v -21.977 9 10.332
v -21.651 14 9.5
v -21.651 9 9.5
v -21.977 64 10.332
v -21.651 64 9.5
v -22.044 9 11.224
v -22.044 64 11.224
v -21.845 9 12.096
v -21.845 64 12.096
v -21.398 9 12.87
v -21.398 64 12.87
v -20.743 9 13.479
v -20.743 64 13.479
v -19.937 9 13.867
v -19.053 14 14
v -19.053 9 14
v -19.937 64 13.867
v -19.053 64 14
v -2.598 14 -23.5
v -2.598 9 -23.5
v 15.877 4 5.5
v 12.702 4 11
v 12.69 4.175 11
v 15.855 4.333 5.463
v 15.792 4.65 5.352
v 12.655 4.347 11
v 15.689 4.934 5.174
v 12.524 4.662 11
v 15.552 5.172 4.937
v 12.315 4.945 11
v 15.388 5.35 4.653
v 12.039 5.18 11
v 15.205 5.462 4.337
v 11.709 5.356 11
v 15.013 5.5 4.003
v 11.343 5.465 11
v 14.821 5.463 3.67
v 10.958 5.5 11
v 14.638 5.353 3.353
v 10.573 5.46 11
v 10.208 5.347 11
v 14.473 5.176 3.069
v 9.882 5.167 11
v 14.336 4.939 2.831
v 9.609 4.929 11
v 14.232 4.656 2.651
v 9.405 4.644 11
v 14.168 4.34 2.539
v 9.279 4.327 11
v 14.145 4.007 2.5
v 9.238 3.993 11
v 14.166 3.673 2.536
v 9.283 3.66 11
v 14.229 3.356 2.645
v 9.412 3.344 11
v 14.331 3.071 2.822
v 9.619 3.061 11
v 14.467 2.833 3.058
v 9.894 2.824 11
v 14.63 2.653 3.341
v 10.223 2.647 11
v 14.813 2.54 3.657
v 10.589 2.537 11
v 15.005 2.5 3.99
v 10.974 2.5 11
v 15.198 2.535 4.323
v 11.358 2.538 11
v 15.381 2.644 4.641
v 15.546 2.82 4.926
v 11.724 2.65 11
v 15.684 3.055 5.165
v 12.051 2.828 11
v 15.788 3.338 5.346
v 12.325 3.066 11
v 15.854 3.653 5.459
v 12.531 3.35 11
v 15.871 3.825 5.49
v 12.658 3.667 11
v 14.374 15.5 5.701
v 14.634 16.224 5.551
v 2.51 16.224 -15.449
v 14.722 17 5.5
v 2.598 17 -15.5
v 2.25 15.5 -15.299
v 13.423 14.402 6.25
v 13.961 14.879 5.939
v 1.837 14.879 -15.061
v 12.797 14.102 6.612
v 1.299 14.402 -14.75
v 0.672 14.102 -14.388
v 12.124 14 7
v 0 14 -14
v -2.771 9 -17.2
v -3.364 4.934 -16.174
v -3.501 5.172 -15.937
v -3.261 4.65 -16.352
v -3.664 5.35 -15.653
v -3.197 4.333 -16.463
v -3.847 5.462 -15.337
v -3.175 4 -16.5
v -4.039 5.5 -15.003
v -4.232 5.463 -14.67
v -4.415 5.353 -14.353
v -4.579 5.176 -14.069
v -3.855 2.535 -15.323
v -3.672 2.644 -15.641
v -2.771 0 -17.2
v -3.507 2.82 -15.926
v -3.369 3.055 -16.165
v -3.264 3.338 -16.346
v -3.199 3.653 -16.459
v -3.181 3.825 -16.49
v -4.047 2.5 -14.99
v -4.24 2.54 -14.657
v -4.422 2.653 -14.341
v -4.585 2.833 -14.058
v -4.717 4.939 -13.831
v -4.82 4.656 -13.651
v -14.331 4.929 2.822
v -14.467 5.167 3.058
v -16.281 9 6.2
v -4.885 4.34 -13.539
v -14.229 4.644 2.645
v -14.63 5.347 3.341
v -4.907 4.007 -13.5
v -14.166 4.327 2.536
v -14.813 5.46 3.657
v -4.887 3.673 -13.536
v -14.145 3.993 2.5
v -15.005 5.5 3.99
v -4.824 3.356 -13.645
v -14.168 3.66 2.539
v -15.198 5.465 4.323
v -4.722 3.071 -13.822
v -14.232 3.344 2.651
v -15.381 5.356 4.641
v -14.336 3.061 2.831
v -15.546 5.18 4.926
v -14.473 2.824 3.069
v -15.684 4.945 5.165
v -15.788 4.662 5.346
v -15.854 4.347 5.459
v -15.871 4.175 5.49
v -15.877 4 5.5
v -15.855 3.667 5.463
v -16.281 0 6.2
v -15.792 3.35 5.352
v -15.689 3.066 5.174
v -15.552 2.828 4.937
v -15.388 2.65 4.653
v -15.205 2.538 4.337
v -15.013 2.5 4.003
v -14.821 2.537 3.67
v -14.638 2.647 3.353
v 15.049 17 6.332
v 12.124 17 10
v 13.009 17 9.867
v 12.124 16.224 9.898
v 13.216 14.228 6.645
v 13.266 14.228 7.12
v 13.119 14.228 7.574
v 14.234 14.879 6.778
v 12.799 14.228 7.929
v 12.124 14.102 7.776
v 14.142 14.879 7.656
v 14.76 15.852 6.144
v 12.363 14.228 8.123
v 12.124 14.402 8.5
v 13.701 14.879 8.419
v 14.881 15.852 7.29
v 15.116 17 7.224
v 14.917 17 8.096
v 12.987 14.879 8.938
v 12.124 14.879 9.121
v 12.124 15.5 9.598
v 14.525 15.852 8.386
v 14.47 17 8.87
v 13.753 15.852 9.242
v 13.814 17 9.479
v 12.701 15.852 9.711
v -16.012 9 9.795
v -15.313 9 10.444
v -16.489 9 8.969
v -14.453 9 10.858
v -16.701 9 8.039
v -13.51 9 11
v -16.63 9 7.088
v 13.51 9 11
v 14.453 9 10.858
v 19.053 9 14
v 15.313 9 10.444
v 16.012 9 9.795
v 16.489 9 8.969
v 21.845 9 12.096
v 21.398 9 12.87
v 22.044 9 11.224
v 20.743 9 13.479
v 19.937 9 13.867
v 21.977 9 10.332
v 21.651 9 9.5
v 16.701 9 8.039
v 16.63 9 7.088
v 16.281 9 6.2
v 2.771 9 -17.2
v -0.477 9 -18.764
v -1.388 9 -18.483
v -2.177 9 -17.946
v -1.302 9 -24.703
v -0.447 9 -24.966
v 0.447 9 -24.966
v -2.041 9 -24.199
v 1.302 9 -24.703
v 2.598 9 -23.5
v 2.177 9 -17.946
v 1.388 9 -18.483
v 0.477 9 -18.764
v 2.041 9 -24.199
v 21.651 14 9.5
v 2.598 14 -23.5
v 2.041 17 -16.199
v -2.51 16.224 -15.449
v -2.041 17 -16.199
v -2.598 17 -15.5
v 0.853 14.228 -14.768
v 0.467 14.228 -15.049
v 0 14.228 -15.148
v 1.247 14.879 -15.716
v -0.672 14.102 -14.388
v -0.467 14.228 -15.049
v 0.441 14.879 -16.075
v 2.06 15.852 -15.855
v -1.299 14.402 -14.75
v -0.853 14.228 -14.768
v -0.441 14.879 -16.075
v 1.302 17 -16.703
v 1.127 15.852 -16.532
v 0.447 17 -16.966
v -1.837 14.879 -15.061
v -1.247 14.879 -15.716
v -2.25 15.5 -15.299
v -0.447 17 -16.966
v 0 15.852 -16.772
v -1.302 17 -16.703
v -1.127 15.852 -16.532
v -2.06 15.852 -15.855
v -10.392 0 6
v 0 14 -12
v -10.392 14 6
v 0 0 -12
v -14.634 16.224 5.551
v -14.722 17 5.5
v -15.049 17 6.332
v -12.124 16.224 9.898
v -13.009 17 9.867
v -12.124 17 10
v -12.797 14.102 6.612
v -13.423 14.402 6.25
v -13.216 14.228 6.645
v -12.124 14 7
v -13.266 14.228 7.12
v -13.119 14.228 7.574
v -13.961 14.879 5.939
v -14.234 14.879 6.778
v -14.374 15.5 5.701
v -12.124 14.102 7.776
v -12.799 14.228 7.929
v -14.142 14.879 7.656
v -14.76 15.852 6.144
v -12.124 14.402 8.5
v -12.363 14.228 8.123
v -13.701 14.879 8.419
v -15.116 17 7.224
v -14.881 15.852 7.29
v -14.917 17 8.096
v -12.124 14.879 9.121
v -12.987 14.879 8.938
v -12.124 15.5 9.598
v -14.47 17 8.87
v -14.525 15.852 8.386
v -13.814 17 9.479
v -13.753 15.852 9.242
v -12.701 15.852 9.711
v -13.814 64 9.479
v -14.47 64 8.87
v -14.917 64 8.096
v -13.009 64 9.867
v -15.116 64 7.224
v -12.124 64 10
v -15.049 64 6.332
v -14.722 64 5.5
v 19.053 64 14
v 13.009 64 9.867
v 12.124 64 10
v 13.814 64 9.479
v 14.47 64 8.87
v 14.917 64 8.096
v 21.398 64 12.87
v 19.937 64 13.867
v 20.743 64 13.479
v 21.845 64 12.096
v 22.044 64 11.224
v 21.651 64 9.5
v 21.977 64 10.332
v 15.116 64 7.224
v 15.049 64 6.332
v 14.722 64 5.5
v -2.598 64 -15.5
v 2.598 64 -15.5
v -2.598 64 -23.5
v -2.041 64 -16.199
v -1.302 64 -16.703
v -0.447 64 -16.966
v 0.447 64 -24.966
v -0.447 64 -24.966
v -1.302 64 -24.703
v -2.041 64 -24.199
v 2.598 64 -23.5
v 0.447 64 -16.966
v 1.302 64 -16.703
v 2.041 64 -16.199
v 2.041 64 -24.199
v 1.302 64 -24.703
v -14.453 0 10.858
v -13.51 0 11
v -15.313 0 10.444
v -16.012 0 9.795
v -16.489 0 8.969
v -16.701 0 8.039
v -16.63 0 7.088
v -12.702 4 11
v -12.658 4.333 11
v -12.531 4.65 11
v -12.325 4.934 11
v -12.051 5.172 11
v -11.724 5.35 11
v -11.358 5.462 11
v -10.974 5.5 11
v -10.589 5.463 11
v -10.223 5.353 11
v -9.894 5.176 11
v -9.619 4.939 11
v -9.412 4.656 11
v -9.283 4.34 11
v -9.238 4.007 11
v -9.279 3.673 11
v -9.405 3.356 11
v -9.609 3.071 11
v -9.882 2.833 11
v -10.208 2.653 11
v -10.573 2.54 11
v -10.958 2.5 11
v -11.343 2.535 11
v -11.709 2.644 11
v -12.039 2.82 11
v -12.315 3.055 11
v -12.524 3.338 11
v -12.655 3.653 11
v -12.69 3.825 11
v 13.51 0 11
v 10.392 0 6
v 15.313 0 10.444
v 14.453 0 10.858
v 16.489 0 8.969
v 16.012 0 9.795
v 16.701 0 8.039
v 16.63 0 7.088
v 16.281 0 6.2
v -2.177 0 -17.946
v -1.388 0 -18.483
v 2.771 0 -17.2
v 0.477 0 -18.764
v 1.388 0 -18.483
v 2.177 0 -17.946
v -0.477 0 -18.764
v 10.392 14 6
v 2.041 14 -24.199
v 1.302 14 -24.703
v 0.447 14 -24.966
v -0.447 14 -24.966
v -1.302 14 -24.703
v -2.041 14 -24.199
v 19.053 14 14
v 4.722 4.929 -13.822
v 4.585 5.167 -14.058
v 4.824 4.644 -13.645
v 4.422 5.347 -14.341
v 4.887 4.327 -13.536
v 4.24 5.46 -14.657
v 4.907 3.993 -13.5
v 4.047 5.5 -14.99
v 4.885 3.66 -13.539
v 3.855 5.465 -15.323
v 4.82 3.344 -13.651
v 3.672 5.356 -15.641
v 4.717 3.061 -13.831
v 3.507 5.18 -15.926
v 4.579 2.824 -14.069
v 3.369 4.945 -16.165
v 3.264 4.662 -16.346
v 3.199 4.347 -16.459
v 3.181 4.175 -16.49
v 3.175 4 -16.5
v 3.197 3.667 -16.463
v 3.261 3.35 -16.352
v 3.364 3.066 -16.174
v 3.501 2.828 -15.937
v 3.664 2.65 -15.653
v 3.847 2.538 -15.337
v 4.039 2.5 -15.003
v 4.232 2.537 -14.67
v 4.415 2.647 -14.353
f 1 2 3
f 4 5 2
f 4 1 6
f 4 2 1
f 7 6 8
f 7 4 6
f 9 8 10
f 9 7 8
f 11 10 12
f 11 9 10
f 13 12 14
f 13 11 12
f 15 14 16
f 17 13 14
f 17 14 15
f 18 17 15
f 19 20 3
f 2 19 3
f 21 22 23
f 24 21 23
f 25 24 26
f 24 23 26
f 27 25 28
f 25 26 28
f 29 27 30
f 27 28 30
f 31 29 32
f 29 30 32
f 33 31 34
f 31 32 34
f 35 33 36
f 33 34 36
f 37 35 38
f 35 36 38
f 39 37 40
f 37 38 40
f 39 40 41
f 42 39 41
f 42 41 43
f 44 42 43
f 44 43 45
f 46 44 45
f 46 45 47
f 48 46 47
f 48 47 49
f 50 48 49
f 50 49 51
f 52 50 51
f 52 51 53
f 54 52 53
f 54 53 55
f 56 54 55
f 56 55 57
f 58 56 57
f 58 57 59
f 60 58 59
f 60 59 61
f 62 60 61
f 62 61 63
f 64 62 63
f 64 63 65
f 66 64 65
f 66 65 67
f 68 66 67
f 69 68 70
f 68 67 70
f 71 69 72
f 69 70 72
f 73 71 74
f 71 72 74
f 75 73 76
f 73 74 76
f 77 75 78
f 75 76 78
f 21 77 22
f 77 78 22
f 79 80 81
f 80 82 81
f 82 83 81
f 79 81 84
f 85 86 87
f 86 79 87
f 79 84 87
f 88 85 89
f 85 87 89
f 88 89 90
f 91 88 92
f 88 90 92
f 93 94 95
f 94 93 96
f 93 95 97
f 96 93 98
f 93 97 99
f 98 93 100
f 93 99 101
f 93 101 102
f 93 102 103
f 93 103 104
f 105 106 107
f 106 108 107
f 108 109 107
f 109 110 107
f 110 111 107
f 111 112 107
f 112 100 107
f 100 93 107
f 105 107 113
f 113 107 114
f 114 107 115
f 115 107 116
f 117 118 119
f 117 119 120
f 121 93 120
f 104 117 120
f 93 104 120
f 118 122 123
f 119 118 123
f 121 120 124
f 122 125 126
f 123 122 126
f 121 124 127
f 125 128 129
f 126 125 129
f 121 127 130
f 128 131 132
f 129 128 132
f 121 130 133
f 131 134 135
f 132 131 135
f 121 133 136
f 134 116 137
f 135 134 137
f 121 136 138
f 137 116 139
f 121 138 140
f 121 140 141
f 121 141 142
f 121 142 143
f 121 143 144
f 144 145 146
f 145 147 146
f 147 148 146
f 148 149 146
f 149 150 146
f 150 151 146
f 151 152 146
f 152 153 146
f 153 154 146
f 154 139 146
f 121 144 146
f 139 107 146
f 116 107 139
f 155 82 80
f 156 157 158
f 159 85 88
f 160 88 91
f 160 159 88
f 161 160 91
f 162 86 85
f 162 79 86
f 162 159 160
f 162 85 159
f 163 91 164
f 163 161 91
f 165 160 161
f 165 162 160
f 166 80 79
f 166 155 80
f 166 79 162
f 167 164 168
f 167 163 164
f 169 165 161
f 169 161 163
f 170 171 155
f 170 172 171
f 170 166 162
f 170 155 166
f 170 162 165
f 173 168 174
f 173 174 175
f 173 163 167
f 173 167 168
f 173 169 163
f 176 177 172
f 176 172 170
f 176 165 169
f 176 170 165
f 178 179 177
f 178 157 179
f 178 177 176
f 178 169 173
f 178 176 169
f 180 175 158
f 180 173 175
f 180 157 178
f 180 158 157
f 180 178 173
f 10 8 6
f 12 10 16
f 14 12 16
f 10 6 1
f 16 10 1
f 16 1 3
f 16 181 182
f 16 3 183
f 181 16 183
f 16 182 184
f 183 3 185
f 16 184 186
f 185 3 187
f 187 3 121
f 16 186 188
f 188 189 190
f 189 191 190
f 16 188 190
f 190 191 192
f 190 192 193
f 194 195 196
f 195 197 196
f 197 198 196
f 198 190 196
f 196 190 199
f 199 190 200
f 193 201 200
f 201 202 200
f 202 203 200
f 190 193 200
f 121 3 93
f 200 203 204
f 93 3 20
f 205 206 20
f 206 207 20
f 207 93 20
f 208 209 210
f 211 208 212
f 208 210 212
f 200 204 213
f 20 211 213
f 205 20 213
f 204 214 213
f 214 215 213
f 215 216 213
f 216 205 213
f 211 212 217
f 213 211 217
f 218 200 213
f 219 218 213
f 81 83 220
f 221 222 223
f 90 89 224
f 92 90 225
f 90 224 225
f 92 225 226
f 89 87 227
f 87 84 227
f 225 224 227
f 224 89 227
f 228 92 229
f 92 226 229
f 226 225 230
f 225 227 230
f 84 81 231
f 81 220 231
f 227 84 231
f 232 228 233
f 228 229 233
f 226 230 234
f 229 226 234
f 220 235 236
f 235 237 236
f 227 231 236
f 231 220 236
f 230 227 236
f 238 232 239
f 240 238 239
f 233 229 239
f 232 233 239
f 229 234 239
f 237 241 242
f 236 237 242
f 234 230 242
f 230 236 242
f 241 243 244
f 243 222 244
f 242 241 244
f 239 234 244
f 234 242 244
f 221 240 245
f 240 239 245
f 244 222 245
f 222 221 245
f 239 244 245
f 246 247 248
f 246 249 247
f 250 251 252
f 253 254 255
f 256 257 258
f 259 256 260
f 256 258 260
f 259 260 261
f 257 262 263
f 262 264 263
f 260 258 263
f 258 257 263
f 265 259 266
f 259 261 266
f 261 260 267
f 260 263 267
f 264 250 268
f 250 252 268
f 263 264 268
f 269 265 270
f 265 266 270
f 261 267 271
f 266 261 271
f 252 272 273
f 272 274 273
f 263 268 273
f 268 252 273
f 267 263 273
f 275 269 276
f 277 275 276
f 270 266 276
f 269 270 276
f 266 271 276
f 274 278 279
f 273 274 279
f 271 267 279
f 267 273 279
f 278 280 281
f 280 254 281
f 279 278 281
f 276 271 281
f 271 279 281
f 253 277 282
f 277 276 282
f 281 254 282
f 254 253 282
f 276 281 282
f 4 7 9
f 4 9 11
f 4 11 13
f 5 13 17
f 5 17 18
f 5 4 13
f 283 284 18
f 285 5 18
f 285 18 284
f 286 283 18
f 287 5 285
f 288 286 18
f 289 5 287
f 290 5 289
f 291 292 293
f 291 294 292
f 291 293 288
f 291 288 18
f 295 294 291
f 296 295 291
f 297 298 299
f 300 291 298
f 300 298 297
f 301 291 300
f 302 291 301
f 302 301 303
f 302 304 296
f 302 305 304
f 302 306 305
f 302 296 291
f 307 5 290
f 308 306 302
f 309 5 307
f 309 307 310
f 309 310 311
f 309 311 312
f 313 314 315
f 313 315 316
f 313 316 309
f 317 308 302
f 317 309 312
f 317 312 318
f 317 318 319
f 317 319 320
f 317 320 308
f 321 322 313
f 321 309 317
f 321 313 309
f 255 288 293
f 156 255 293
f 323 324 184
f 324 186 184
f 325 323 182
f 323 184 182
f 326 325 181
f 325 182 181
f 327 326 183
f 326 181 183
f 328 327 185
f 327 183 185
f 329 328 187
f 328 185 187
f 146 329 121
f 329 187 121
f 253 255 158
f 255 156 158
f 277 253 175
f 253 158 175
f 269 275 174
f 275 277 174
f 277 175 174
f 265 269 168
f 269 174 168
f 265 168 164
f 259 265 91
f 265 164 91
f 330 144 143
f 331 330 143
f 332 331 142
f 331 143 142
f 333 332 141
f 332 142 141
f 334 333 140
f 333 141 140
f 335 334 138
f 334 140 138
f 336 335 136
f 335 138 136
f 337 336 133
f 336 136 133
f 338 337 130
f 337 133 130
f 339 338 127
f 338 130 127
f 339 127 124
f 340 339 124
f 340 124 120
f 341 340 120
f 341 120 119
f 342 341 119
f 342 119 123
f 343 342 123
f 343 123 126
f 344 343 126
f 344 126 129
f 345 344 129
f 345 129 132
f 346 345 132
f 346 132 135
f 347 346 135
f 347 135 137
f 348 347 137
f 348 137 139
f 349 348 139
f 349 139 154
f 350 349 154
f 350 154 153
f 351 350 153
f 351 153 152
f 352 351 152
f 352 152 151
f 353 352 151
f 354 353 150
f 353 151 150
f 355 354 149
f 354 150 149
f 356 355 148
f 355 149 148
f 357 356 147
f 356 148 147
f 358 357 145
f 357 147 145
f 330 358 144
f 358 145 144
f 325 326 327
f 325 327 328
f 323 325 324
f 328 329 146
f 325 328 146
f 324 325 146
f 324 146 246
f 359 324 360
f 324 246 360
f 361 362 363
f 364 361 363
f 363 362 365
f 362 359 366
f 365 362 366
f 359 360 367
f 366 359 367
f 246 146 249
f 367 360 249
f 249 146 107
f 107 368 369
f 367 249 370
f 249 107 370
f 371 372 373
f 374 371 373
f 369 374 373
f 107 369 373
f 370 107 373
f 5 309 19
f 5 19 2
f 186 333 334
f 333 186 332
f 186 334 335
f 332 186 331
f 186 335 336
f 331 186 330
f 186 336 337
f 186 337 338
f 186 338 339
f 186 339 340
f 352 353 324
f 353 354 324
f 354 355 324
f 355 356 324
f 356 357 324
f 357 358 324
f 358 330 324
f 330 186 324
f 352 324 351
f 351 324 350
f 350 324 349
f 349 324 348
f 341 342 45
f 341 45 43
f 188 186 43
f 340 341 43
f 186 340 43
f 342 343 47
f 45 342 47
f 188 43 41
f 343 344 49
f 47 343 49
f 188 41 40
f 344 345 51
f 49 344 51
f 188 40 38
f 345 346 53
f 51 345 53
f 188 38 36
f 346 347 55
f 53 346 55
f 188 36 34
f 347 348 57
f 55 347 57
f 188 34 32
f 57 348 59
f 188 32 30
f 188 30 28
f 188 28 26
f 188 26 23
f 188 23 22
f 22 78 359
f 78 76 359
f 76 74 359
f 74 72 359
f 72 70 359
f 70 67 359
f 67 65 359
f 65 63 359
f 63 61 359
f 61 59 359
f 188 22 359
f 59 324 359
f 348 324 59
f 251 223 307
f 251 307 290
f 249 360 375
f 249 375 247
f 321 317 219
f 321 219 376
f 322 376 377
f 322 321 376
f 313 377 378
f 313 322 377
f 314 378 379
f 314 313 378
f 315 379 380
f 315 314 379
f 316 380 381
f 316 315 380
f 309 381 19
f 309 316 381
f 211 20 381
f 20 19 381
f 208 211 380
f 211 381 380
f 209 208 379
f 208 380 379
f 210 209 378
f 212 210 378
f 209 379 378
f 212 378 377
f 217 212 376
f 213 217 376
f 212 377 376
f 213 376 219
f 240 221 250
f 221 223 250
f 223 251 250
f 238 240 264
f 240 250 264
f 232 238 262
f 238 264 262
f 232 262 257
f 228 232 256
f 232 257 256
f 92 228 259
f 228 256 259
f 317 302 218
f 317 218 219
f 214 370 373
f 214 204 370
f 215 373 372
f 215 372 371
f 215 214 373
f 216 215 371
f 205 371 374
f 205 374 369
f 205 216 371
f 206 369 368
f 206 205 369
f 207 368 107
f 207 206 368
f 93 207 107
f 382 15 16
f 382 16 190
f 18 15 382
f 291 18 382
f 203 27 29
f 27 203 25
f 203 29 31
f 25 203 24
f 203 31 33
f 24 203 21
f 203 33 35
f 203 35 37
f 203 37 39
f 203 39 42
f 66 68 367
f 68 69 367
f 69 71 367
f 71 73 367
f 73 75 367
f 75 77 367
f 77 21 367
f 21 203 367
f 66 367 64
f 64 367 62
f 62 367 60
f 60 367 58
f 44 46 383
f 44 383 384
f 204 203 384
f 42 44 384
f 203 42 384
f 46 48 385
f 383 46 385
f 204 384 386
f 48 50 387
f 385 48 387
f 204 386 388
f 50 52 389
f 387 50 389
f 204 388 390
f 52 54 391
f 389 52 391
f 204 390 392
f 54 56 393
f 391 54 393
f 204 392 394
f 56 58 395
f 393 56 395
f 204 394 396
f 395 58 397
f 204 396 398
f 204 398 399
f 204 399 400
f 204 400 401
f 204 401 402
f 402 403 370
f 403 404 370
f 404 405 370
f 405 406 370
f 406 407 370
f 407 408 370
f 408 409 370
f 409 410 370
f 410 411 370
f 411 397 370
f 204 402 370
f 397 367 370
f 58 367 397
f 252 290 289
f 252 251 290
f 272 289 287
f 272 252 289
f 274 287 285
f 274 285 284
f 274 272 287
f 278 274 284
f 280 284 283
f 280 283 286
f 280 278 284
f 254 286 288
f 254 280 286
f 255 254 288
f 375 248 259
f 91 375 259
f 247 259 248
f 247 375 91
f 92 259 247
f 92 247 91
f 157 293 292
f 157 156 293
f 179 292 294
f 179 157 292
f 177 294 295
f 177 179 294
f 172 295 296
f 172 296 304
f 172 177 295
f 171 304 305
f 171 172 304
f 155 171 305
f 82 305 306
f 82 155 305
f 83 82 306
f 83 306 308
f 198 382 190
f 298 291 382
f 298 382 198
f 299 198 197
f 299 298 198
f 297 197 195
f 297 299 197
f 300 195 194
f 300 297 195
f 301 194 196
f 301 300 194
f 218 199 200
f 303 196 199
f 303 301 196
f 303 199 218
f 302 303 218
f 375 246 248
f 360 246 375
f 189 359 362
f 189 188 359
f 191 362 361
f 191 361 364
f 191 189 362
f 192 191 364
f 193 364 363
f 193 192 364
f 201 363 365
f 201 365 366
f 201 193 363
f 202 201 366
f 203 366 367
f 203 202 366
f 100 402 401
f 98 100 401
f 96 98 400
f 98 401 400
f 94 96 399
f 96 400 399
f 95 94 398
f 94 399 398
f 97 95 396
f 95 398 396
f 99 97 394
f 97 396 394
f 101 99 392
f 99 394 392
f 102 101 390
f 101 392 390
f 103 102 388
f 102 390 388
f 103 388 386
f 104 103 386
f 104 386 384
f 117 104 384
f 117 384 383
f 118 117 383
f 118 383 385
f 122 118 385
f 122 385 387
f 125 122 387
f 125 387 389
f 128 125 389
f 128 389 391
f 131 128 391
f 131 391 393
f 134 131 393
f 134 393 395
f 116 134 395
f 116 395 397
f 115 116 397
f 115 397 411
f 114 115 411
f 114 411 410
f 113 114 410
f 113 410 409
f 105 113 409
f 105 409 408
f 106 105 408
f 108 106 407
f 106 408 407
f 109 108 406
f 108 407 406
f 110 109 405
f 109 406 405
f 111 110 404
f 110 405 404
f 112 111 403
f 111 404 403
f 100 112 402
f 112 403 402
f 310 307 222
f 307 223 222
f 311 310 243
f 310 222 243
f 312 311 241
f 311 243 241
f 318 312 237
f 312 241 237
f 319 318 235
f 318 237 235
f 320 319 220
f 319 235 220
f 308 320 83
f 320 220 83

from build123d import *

# Parameters (mm, degrees)
EXTRUDE_1_DEPTH          = 9
EXTRUDE_2_DEPTH          = 5
FILLET_1_R               = 3.2
SKETCH_5_R               = 1.5
CUT_EXTRUDE_1_DEPTH      = 18
PATTERN_CIRCULAR_1_COUNT = 3
FILLET_2_R               = 3
EXTRUDE_START            = 50
EXTRUDE_3_DEPTH          = 50
FILLET_3_R               = 3


with BuildPart() as part:
    # 草图1 → 凸台-拉伸1 (new body)
    with BuildSketch(Plane(origin=(0, 0, 0), x_dir=(1, 0, 0), z_dir=(0, 1, 0))):
        Polygon((0, 22), (-19.052558883, -11), (19.052558883, -11), align=None)
        Polygon((0, 12), (-10.392304845, -6), (10.392304845, -6), align=None, mode=Mode.SUBTRACT)
    extrude(amount=EXTRUDE_1_DEPTH)

    # 草图3 → 凸台-拉伸2 (add)
    with BuildSketch(Plane(origin=(0, 9, 0), x_dir=(1, 0, 0), z_dir=(0, 1, 0))):
        Polygon((0, 28), (-24.248711306, -14), (24.248711306, -14), align=None)
        Polygon((0, 12), (-10.392304845, -6), (10.392304845, -6), align=None, mode=Mode.SUBTRACT)
    extrude(amount=EXTRUDE_2_DEPTH)

    # 圆角1
    fillet_1_edges = [part.edges().sort_by_distance(p)[0] for p in [
        (19.052558883, 4.5, 11),
        (-19.052558883, 4.5, 11),
        (0, 4.5, -22),
    ]]
    fillet(fillet_1_edges, radius=FILLET_1_R)

    # 草图5 → 切除-拉伸1 (cut)
    with BuildSketch(Plane(origin=(7, -46, 0), x_dir=(0, 0, -1), z_dir=(1, 0, 0))):
        with Locations((15, 50)):
            Circle(SKETCH_5_R)
    cut_extrude_1 = extrude(amount=-CUT_EXTRUDE_1_DEPTH, mode=Mode.SUBTRACT)

    # 阵列(圆周)1: 切除-拉伸1 ×3 about axis
    pattern_circular_1_axis = Axis((0, 0, 0), (0, 1, 0))
    for i in range(1, PATTERN_CIRCULAR_1_COUNT):
        add(cut_extrude_1.rotate(pattern_circular_1_axis, i * 360 / PATTERN_CIRCULAR_1_COUNT), mode=Mode.SUBTRACT)

    # 圆角2
    fillet_2_edges = [part.edges().sort_by_distance(p)[0] for p in [
        (24.248711306, 11.5, 14),
        (0, 11.5, -28),
        (-24.248711306, 11.5, 14),
    ]]
    fillet(fillet_2_edges, radius=FILLET_2_R)

    # 草图6 → 凸台-拉伸3 (add)
    with BuildSketch(Plane(origin=(0, 14, 0), x_dir=(1, 0, 0), z_dir=(0, 1, 0)).offset(EXTRUDE_START)):
        with BuildLine():
            Line((-2.598076211, 23.5), (-21.650635095, -9.5))
            ThreePointArc((-21.650635095, -9.5), (-21.650635095, -12.5), (-19.052558883, -14))
            Line((-19.052558883, -14), (19.052558883, -14))
            ThreePointArc((19.052558883, -14), (21.650635095, -12.5), (21.650635095, -9.5))
            Line((21.650635095, -9.5), (2.598076211, 23.5))
            ThreePointArc((2.598076211, 23.5), (0, 25), (-2.598076211, 23.5))
        make_face()
        Polygon((0, 20), (-17.320508076, -10), (17.320508076, -10), align=None, mode=Mode.SUBTRACT)
    extrude(amount=-EXTRUDE_3_DEPTH)

    # 圆角3
    fillet_3_edges = [part.edges().sort_by_distance(p)[0] for p in [
        (8.660254038, 14, -5),
        (-8.660254038, 14, -5),
        (0, 14, 10),
        (0, 39, -20),
        (-17.320508076, 39, 10),
        (17.320508076, 39, 10),
    ]]
    fillet(fillet_3_edges, radius=FILLET_3_R)


solid = part.part
